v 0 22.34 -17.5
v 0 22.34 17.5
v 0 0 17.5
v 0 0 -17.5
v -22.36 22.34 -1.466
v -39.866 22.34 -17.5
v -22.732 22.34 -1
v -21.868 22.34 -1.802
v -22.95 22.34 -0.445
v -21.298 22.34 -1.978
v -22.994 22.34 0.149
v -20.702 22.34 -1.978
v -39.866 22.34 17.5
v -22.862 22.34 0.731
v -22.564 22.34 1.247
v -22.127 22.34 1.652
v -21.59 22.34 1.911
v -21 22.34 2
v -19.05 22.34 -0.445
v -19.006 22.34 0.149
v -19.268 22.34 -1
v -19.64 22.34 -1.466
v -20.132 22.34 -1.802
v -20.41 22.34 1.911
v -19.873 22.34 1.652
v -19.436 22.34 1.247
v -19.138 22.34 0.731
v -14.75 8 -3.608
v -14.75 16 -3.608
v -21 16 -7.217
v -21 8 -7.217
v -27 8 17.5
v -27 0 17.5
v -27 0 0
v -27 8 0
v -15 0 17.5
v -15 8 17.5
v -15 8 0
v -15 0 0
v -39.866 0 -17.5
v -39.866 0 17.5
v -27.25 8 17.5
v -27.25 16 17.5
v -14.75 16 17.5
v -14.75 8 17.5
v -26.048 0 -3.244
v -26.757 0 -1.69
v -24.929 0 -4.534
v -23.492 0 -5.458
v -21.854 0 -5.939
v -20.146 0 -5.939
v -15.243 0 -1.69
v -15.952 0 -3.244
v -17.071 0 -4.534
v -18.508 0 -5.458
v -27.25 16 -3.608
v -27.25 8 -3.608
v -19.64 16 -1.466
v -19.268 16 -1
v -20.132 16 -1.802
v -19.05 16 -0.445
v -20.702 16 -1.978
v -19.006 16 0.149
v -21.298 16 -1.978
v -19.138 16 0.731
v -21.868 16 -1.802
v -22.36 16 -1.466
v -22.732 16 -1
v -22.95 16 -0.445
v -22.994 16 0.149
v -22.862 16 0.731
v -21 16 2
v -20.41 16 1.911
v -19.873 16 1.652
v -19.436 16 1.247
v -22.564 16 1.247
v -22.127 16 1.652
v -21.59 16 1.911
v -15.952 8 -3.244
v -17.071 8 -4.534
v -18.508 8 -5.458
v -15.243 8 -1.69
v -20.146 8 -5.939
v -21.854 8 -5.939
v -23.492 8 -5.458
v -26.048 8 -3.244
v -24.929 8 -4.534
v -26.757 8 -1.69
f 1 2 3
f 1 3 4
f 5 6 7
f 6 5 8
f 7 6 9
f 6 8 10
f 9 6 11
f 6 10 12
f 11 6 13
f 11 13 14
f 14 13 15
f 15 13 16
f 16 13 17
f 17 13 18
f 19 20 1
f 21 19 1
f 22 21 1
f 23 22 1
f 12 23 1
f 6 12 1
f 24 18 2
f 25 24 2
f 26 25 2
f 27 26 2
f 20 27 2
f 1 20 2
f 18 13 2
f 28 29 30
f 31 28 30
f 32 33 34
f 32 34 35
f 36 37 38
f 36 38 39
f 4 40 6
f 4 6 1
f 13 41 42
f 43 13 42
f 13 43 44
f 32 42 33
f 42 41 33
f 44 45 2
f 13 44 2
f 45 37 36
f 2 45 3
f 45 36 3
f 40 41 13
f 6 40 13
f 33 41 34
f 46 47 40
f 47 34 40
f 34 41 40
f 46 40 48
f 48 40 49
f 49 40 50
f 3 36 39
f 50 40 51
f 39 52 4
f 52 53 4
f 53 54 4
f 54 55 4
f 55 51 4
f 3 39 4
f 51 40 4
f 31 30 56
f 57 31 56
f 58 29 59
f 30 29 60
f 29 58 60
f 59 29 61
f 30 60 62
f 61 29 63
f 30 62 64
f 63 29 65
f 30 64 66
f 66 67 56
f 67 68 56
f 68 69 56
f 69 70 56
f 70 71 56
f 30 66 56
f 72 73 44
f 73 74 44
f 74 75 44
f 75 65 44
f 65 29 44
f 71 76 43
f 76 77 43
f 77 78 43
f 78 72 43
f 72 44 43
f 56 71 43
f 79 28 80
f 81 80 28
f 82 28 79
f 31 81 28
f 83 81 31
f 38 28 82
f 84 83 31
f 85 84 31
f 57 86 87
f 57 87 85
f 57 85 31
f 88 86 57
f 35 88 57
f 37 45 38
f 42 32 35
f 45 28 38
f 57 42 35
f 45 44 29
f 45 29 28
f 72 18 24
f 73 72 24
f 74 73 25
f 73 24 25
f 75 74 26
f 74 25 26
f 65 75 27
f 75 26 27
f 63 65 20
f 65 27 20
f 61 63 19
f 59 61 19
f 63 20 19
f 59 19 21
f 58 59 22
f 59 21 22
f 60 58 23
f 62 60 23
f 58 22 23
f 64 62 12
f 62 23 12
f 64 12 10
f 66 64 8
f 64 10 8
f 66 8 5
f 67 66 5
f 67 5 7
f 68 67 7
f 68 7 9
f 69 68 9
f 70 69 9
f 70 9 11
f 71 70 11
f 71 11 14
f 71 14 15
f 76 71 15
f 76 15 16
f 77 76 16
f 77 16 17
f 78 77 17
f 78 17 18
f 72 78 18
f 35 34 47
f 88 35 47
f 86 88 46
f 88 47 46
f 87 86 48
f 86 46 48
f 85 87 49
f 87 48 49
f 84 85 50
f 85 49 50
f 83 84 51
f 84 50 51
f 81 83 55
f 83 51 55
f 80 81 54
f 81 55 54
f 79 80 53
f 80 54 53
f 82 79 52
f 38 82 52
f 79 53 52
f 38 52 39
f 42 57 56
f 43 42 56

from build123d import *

# Parameters (mm, degrees)
SKETCH2_W           = 200
SKETCH2_H           = 35
BOSS_EXTRUDE1_DEPTH = 30
SKETCH3_R           = 6
CUT_EXTRUDE1_DEPTH  = 203.993226488
CUT_EXTRUDE2_DEPTH  = 22
SKETCH6_W           = 22.496439662
SKETCH6_H           = 14
BOSS_EXTRUDE3_DEPTH = 38
CUT_EXTRUDE4_DEPTH  = 17.5
SKETCH9_R           = 2
CUT_EXTRUDE5_DEPTH  = 38
SKETCH10_R          = 2.25
CUT_EXTRUDE6_DEPTH  = 20
SKETCH12_W          = 4.5
SKETCH12_H          = 7.5
CUT_EXTRUDE7_DEPTH  = 46
SKETCH14_W          = 405.367486884
SKETCH14_H          = 144.136743288
CUT_EXTRUDE9_DEPTH  = 206.243757518


with BuildPart() as part:
    # Sketch2 → Boss-Extrude1 (new body)
    with BuildSketch(Plane(origin=(0, 0, 0), x_dir=(1, 0, 0), z_dir=(0, 1, 0))):
        with Locations((-100, 0)):
            Rectangle(SKETCH2_W, SKETCH2_H)
    extrude(amount=BOSS_EXTRUDE1_DEPTH)

    # Sketch3 → Cut-Extrude1 (cut, through all)
    with BuildSketch(Plane.XZ):
        with Locations(Location((-21, 0, 0), (0, 0, 270))):
            Circle(SKETCH3_R)
    extrude(amount=-CUT_EXTRUDE1_DEPTH, mode=Mode.SUBTRACT)

    # Sketch4 → Cut-Extrude2 (cut)
    with BuildSketch(Plane(origin=(0, 30, 0), x_dir=(1, 0, 0), z_dir=(0, 1, 0))):
        Polygon((-14.75, 3.608439182), (-21, 7.216878365), (-27.25, 3.608439182), (-27.25, -3.608439182), (-21, -7.216878365), (-14.75, -3.608439182), align=None)
    extrude(amount=-CUT_EXTRUDE2_DEPTH, mode=Mode.SUBTRACT)

    # Sketch6 → Boss-Extrude3 (add)
    with BuildSketch(Plane(origin=(0, 0, 0), x_dir=(0, 0, -1), z_dir=(1, 0, 0))):
        with Locations((0.204742288, 23)):
            Rectangle(SKETCH6_W, SKETCH6_H)
    extrude(amount=-BOSS_EXTRUDE3_DEPTH)

    # Sketch7 → Cut-Extrude4 (cut)
    with BuildSketch(Plane.XY.offset(17.5)):
        Polygon((-21, 16), (-14.75, 16), (-14.75, 8), (-15, 8), (-15, 0), (-27, 0), (-27, 8), (-27.25, 8), (-27.25, 16), align=None)
    extrude(amount=-CUT_EXTRUDE4_DEPTH, mode=Mode.SUBTRACT)

    # Sketch9 → Cut-Extrude5 (cut)
    with BuildSketch(Plane(origin=(0, 30, 0), x_dir=(1, 0, 0), z_dir=(0, 1, 0))):
        with Locations(Location((-21, 0, 0), (0, 0, 270))):
            Circle(SKETCH9_R)
    extrude(amount=-CUT_EXTRUDE5_DEPTH, mode=Mode.SUBTRACT)

    # Sketch10 → Cut-Extrude6 (cut)
    with BuildSketch(Plane.ZY.offset(200)):
        with Locations((6.5, 21.5)):
            Circle(SKETCH10_R)
        with Locations((6.5, 8.5)):
            Circle(SKETCH10_R)
        with Locations((-6.5, 8.5)):
            Circle(SKETCH10_R)
        with Locations((-6.5, 21.5)):
            Circle(SKETCH10_R)
    extrude(amount=-CUT_EXTRUDE6_DEPTH, mode=Mode.SUBTRACT)

    # Sketch12 → Cut-Extrude7 (cut)
    with BuildSketch(Plane(origin=(0, 30, 0), x_dir=(1, 0, 0), z_dir=(0, 1, 0))):
        with Locations((-191.75, -6.5625)):
            Rectangle(SKETCH12_W, SKETCH12_H)
        with Locations((-191.75, 6.5625)):
            Rectangle(SKETCH12_W, SKETCH12_H)
    extrude(amount=-CUT_EXTRUDE7_DEPTH, mode=Mode.SUBTRACT)

    # Sketch14 → Cut-Extrude9 (cut, through all)
    # profile 1 of 2: a face of its own
    with BuildSketch(Plane.XY.offset(17.5)):
        with Locations((-15, 0)):
            Rectangle(SKETCH14_W, SKETCH14_H)
        Polygon((0, 30), (0, 22.340454029), (9.526767724, 22.340454029), (9.526767724, -15.531579882), (-39.86578, -15.531579882), (-39.86578, 0), (-200, 0), (-200, 30), align=None, mode=Mode.SUBTRACT)
    # profile 2 of 2: a face of its own
    with BuildSketch(Plane.XY.offset(17.5)):
        Polygon((-39.86578, 0), (-39.86578, 22.340454029), (0, 22.340454029), (0, 30), (-200, 30), (-200, 0), align=None)
    extrude(amount=-CUT_EXTRUDE9_DEPTH, mode=Mode.SUBTRACT)


solid = part.part
